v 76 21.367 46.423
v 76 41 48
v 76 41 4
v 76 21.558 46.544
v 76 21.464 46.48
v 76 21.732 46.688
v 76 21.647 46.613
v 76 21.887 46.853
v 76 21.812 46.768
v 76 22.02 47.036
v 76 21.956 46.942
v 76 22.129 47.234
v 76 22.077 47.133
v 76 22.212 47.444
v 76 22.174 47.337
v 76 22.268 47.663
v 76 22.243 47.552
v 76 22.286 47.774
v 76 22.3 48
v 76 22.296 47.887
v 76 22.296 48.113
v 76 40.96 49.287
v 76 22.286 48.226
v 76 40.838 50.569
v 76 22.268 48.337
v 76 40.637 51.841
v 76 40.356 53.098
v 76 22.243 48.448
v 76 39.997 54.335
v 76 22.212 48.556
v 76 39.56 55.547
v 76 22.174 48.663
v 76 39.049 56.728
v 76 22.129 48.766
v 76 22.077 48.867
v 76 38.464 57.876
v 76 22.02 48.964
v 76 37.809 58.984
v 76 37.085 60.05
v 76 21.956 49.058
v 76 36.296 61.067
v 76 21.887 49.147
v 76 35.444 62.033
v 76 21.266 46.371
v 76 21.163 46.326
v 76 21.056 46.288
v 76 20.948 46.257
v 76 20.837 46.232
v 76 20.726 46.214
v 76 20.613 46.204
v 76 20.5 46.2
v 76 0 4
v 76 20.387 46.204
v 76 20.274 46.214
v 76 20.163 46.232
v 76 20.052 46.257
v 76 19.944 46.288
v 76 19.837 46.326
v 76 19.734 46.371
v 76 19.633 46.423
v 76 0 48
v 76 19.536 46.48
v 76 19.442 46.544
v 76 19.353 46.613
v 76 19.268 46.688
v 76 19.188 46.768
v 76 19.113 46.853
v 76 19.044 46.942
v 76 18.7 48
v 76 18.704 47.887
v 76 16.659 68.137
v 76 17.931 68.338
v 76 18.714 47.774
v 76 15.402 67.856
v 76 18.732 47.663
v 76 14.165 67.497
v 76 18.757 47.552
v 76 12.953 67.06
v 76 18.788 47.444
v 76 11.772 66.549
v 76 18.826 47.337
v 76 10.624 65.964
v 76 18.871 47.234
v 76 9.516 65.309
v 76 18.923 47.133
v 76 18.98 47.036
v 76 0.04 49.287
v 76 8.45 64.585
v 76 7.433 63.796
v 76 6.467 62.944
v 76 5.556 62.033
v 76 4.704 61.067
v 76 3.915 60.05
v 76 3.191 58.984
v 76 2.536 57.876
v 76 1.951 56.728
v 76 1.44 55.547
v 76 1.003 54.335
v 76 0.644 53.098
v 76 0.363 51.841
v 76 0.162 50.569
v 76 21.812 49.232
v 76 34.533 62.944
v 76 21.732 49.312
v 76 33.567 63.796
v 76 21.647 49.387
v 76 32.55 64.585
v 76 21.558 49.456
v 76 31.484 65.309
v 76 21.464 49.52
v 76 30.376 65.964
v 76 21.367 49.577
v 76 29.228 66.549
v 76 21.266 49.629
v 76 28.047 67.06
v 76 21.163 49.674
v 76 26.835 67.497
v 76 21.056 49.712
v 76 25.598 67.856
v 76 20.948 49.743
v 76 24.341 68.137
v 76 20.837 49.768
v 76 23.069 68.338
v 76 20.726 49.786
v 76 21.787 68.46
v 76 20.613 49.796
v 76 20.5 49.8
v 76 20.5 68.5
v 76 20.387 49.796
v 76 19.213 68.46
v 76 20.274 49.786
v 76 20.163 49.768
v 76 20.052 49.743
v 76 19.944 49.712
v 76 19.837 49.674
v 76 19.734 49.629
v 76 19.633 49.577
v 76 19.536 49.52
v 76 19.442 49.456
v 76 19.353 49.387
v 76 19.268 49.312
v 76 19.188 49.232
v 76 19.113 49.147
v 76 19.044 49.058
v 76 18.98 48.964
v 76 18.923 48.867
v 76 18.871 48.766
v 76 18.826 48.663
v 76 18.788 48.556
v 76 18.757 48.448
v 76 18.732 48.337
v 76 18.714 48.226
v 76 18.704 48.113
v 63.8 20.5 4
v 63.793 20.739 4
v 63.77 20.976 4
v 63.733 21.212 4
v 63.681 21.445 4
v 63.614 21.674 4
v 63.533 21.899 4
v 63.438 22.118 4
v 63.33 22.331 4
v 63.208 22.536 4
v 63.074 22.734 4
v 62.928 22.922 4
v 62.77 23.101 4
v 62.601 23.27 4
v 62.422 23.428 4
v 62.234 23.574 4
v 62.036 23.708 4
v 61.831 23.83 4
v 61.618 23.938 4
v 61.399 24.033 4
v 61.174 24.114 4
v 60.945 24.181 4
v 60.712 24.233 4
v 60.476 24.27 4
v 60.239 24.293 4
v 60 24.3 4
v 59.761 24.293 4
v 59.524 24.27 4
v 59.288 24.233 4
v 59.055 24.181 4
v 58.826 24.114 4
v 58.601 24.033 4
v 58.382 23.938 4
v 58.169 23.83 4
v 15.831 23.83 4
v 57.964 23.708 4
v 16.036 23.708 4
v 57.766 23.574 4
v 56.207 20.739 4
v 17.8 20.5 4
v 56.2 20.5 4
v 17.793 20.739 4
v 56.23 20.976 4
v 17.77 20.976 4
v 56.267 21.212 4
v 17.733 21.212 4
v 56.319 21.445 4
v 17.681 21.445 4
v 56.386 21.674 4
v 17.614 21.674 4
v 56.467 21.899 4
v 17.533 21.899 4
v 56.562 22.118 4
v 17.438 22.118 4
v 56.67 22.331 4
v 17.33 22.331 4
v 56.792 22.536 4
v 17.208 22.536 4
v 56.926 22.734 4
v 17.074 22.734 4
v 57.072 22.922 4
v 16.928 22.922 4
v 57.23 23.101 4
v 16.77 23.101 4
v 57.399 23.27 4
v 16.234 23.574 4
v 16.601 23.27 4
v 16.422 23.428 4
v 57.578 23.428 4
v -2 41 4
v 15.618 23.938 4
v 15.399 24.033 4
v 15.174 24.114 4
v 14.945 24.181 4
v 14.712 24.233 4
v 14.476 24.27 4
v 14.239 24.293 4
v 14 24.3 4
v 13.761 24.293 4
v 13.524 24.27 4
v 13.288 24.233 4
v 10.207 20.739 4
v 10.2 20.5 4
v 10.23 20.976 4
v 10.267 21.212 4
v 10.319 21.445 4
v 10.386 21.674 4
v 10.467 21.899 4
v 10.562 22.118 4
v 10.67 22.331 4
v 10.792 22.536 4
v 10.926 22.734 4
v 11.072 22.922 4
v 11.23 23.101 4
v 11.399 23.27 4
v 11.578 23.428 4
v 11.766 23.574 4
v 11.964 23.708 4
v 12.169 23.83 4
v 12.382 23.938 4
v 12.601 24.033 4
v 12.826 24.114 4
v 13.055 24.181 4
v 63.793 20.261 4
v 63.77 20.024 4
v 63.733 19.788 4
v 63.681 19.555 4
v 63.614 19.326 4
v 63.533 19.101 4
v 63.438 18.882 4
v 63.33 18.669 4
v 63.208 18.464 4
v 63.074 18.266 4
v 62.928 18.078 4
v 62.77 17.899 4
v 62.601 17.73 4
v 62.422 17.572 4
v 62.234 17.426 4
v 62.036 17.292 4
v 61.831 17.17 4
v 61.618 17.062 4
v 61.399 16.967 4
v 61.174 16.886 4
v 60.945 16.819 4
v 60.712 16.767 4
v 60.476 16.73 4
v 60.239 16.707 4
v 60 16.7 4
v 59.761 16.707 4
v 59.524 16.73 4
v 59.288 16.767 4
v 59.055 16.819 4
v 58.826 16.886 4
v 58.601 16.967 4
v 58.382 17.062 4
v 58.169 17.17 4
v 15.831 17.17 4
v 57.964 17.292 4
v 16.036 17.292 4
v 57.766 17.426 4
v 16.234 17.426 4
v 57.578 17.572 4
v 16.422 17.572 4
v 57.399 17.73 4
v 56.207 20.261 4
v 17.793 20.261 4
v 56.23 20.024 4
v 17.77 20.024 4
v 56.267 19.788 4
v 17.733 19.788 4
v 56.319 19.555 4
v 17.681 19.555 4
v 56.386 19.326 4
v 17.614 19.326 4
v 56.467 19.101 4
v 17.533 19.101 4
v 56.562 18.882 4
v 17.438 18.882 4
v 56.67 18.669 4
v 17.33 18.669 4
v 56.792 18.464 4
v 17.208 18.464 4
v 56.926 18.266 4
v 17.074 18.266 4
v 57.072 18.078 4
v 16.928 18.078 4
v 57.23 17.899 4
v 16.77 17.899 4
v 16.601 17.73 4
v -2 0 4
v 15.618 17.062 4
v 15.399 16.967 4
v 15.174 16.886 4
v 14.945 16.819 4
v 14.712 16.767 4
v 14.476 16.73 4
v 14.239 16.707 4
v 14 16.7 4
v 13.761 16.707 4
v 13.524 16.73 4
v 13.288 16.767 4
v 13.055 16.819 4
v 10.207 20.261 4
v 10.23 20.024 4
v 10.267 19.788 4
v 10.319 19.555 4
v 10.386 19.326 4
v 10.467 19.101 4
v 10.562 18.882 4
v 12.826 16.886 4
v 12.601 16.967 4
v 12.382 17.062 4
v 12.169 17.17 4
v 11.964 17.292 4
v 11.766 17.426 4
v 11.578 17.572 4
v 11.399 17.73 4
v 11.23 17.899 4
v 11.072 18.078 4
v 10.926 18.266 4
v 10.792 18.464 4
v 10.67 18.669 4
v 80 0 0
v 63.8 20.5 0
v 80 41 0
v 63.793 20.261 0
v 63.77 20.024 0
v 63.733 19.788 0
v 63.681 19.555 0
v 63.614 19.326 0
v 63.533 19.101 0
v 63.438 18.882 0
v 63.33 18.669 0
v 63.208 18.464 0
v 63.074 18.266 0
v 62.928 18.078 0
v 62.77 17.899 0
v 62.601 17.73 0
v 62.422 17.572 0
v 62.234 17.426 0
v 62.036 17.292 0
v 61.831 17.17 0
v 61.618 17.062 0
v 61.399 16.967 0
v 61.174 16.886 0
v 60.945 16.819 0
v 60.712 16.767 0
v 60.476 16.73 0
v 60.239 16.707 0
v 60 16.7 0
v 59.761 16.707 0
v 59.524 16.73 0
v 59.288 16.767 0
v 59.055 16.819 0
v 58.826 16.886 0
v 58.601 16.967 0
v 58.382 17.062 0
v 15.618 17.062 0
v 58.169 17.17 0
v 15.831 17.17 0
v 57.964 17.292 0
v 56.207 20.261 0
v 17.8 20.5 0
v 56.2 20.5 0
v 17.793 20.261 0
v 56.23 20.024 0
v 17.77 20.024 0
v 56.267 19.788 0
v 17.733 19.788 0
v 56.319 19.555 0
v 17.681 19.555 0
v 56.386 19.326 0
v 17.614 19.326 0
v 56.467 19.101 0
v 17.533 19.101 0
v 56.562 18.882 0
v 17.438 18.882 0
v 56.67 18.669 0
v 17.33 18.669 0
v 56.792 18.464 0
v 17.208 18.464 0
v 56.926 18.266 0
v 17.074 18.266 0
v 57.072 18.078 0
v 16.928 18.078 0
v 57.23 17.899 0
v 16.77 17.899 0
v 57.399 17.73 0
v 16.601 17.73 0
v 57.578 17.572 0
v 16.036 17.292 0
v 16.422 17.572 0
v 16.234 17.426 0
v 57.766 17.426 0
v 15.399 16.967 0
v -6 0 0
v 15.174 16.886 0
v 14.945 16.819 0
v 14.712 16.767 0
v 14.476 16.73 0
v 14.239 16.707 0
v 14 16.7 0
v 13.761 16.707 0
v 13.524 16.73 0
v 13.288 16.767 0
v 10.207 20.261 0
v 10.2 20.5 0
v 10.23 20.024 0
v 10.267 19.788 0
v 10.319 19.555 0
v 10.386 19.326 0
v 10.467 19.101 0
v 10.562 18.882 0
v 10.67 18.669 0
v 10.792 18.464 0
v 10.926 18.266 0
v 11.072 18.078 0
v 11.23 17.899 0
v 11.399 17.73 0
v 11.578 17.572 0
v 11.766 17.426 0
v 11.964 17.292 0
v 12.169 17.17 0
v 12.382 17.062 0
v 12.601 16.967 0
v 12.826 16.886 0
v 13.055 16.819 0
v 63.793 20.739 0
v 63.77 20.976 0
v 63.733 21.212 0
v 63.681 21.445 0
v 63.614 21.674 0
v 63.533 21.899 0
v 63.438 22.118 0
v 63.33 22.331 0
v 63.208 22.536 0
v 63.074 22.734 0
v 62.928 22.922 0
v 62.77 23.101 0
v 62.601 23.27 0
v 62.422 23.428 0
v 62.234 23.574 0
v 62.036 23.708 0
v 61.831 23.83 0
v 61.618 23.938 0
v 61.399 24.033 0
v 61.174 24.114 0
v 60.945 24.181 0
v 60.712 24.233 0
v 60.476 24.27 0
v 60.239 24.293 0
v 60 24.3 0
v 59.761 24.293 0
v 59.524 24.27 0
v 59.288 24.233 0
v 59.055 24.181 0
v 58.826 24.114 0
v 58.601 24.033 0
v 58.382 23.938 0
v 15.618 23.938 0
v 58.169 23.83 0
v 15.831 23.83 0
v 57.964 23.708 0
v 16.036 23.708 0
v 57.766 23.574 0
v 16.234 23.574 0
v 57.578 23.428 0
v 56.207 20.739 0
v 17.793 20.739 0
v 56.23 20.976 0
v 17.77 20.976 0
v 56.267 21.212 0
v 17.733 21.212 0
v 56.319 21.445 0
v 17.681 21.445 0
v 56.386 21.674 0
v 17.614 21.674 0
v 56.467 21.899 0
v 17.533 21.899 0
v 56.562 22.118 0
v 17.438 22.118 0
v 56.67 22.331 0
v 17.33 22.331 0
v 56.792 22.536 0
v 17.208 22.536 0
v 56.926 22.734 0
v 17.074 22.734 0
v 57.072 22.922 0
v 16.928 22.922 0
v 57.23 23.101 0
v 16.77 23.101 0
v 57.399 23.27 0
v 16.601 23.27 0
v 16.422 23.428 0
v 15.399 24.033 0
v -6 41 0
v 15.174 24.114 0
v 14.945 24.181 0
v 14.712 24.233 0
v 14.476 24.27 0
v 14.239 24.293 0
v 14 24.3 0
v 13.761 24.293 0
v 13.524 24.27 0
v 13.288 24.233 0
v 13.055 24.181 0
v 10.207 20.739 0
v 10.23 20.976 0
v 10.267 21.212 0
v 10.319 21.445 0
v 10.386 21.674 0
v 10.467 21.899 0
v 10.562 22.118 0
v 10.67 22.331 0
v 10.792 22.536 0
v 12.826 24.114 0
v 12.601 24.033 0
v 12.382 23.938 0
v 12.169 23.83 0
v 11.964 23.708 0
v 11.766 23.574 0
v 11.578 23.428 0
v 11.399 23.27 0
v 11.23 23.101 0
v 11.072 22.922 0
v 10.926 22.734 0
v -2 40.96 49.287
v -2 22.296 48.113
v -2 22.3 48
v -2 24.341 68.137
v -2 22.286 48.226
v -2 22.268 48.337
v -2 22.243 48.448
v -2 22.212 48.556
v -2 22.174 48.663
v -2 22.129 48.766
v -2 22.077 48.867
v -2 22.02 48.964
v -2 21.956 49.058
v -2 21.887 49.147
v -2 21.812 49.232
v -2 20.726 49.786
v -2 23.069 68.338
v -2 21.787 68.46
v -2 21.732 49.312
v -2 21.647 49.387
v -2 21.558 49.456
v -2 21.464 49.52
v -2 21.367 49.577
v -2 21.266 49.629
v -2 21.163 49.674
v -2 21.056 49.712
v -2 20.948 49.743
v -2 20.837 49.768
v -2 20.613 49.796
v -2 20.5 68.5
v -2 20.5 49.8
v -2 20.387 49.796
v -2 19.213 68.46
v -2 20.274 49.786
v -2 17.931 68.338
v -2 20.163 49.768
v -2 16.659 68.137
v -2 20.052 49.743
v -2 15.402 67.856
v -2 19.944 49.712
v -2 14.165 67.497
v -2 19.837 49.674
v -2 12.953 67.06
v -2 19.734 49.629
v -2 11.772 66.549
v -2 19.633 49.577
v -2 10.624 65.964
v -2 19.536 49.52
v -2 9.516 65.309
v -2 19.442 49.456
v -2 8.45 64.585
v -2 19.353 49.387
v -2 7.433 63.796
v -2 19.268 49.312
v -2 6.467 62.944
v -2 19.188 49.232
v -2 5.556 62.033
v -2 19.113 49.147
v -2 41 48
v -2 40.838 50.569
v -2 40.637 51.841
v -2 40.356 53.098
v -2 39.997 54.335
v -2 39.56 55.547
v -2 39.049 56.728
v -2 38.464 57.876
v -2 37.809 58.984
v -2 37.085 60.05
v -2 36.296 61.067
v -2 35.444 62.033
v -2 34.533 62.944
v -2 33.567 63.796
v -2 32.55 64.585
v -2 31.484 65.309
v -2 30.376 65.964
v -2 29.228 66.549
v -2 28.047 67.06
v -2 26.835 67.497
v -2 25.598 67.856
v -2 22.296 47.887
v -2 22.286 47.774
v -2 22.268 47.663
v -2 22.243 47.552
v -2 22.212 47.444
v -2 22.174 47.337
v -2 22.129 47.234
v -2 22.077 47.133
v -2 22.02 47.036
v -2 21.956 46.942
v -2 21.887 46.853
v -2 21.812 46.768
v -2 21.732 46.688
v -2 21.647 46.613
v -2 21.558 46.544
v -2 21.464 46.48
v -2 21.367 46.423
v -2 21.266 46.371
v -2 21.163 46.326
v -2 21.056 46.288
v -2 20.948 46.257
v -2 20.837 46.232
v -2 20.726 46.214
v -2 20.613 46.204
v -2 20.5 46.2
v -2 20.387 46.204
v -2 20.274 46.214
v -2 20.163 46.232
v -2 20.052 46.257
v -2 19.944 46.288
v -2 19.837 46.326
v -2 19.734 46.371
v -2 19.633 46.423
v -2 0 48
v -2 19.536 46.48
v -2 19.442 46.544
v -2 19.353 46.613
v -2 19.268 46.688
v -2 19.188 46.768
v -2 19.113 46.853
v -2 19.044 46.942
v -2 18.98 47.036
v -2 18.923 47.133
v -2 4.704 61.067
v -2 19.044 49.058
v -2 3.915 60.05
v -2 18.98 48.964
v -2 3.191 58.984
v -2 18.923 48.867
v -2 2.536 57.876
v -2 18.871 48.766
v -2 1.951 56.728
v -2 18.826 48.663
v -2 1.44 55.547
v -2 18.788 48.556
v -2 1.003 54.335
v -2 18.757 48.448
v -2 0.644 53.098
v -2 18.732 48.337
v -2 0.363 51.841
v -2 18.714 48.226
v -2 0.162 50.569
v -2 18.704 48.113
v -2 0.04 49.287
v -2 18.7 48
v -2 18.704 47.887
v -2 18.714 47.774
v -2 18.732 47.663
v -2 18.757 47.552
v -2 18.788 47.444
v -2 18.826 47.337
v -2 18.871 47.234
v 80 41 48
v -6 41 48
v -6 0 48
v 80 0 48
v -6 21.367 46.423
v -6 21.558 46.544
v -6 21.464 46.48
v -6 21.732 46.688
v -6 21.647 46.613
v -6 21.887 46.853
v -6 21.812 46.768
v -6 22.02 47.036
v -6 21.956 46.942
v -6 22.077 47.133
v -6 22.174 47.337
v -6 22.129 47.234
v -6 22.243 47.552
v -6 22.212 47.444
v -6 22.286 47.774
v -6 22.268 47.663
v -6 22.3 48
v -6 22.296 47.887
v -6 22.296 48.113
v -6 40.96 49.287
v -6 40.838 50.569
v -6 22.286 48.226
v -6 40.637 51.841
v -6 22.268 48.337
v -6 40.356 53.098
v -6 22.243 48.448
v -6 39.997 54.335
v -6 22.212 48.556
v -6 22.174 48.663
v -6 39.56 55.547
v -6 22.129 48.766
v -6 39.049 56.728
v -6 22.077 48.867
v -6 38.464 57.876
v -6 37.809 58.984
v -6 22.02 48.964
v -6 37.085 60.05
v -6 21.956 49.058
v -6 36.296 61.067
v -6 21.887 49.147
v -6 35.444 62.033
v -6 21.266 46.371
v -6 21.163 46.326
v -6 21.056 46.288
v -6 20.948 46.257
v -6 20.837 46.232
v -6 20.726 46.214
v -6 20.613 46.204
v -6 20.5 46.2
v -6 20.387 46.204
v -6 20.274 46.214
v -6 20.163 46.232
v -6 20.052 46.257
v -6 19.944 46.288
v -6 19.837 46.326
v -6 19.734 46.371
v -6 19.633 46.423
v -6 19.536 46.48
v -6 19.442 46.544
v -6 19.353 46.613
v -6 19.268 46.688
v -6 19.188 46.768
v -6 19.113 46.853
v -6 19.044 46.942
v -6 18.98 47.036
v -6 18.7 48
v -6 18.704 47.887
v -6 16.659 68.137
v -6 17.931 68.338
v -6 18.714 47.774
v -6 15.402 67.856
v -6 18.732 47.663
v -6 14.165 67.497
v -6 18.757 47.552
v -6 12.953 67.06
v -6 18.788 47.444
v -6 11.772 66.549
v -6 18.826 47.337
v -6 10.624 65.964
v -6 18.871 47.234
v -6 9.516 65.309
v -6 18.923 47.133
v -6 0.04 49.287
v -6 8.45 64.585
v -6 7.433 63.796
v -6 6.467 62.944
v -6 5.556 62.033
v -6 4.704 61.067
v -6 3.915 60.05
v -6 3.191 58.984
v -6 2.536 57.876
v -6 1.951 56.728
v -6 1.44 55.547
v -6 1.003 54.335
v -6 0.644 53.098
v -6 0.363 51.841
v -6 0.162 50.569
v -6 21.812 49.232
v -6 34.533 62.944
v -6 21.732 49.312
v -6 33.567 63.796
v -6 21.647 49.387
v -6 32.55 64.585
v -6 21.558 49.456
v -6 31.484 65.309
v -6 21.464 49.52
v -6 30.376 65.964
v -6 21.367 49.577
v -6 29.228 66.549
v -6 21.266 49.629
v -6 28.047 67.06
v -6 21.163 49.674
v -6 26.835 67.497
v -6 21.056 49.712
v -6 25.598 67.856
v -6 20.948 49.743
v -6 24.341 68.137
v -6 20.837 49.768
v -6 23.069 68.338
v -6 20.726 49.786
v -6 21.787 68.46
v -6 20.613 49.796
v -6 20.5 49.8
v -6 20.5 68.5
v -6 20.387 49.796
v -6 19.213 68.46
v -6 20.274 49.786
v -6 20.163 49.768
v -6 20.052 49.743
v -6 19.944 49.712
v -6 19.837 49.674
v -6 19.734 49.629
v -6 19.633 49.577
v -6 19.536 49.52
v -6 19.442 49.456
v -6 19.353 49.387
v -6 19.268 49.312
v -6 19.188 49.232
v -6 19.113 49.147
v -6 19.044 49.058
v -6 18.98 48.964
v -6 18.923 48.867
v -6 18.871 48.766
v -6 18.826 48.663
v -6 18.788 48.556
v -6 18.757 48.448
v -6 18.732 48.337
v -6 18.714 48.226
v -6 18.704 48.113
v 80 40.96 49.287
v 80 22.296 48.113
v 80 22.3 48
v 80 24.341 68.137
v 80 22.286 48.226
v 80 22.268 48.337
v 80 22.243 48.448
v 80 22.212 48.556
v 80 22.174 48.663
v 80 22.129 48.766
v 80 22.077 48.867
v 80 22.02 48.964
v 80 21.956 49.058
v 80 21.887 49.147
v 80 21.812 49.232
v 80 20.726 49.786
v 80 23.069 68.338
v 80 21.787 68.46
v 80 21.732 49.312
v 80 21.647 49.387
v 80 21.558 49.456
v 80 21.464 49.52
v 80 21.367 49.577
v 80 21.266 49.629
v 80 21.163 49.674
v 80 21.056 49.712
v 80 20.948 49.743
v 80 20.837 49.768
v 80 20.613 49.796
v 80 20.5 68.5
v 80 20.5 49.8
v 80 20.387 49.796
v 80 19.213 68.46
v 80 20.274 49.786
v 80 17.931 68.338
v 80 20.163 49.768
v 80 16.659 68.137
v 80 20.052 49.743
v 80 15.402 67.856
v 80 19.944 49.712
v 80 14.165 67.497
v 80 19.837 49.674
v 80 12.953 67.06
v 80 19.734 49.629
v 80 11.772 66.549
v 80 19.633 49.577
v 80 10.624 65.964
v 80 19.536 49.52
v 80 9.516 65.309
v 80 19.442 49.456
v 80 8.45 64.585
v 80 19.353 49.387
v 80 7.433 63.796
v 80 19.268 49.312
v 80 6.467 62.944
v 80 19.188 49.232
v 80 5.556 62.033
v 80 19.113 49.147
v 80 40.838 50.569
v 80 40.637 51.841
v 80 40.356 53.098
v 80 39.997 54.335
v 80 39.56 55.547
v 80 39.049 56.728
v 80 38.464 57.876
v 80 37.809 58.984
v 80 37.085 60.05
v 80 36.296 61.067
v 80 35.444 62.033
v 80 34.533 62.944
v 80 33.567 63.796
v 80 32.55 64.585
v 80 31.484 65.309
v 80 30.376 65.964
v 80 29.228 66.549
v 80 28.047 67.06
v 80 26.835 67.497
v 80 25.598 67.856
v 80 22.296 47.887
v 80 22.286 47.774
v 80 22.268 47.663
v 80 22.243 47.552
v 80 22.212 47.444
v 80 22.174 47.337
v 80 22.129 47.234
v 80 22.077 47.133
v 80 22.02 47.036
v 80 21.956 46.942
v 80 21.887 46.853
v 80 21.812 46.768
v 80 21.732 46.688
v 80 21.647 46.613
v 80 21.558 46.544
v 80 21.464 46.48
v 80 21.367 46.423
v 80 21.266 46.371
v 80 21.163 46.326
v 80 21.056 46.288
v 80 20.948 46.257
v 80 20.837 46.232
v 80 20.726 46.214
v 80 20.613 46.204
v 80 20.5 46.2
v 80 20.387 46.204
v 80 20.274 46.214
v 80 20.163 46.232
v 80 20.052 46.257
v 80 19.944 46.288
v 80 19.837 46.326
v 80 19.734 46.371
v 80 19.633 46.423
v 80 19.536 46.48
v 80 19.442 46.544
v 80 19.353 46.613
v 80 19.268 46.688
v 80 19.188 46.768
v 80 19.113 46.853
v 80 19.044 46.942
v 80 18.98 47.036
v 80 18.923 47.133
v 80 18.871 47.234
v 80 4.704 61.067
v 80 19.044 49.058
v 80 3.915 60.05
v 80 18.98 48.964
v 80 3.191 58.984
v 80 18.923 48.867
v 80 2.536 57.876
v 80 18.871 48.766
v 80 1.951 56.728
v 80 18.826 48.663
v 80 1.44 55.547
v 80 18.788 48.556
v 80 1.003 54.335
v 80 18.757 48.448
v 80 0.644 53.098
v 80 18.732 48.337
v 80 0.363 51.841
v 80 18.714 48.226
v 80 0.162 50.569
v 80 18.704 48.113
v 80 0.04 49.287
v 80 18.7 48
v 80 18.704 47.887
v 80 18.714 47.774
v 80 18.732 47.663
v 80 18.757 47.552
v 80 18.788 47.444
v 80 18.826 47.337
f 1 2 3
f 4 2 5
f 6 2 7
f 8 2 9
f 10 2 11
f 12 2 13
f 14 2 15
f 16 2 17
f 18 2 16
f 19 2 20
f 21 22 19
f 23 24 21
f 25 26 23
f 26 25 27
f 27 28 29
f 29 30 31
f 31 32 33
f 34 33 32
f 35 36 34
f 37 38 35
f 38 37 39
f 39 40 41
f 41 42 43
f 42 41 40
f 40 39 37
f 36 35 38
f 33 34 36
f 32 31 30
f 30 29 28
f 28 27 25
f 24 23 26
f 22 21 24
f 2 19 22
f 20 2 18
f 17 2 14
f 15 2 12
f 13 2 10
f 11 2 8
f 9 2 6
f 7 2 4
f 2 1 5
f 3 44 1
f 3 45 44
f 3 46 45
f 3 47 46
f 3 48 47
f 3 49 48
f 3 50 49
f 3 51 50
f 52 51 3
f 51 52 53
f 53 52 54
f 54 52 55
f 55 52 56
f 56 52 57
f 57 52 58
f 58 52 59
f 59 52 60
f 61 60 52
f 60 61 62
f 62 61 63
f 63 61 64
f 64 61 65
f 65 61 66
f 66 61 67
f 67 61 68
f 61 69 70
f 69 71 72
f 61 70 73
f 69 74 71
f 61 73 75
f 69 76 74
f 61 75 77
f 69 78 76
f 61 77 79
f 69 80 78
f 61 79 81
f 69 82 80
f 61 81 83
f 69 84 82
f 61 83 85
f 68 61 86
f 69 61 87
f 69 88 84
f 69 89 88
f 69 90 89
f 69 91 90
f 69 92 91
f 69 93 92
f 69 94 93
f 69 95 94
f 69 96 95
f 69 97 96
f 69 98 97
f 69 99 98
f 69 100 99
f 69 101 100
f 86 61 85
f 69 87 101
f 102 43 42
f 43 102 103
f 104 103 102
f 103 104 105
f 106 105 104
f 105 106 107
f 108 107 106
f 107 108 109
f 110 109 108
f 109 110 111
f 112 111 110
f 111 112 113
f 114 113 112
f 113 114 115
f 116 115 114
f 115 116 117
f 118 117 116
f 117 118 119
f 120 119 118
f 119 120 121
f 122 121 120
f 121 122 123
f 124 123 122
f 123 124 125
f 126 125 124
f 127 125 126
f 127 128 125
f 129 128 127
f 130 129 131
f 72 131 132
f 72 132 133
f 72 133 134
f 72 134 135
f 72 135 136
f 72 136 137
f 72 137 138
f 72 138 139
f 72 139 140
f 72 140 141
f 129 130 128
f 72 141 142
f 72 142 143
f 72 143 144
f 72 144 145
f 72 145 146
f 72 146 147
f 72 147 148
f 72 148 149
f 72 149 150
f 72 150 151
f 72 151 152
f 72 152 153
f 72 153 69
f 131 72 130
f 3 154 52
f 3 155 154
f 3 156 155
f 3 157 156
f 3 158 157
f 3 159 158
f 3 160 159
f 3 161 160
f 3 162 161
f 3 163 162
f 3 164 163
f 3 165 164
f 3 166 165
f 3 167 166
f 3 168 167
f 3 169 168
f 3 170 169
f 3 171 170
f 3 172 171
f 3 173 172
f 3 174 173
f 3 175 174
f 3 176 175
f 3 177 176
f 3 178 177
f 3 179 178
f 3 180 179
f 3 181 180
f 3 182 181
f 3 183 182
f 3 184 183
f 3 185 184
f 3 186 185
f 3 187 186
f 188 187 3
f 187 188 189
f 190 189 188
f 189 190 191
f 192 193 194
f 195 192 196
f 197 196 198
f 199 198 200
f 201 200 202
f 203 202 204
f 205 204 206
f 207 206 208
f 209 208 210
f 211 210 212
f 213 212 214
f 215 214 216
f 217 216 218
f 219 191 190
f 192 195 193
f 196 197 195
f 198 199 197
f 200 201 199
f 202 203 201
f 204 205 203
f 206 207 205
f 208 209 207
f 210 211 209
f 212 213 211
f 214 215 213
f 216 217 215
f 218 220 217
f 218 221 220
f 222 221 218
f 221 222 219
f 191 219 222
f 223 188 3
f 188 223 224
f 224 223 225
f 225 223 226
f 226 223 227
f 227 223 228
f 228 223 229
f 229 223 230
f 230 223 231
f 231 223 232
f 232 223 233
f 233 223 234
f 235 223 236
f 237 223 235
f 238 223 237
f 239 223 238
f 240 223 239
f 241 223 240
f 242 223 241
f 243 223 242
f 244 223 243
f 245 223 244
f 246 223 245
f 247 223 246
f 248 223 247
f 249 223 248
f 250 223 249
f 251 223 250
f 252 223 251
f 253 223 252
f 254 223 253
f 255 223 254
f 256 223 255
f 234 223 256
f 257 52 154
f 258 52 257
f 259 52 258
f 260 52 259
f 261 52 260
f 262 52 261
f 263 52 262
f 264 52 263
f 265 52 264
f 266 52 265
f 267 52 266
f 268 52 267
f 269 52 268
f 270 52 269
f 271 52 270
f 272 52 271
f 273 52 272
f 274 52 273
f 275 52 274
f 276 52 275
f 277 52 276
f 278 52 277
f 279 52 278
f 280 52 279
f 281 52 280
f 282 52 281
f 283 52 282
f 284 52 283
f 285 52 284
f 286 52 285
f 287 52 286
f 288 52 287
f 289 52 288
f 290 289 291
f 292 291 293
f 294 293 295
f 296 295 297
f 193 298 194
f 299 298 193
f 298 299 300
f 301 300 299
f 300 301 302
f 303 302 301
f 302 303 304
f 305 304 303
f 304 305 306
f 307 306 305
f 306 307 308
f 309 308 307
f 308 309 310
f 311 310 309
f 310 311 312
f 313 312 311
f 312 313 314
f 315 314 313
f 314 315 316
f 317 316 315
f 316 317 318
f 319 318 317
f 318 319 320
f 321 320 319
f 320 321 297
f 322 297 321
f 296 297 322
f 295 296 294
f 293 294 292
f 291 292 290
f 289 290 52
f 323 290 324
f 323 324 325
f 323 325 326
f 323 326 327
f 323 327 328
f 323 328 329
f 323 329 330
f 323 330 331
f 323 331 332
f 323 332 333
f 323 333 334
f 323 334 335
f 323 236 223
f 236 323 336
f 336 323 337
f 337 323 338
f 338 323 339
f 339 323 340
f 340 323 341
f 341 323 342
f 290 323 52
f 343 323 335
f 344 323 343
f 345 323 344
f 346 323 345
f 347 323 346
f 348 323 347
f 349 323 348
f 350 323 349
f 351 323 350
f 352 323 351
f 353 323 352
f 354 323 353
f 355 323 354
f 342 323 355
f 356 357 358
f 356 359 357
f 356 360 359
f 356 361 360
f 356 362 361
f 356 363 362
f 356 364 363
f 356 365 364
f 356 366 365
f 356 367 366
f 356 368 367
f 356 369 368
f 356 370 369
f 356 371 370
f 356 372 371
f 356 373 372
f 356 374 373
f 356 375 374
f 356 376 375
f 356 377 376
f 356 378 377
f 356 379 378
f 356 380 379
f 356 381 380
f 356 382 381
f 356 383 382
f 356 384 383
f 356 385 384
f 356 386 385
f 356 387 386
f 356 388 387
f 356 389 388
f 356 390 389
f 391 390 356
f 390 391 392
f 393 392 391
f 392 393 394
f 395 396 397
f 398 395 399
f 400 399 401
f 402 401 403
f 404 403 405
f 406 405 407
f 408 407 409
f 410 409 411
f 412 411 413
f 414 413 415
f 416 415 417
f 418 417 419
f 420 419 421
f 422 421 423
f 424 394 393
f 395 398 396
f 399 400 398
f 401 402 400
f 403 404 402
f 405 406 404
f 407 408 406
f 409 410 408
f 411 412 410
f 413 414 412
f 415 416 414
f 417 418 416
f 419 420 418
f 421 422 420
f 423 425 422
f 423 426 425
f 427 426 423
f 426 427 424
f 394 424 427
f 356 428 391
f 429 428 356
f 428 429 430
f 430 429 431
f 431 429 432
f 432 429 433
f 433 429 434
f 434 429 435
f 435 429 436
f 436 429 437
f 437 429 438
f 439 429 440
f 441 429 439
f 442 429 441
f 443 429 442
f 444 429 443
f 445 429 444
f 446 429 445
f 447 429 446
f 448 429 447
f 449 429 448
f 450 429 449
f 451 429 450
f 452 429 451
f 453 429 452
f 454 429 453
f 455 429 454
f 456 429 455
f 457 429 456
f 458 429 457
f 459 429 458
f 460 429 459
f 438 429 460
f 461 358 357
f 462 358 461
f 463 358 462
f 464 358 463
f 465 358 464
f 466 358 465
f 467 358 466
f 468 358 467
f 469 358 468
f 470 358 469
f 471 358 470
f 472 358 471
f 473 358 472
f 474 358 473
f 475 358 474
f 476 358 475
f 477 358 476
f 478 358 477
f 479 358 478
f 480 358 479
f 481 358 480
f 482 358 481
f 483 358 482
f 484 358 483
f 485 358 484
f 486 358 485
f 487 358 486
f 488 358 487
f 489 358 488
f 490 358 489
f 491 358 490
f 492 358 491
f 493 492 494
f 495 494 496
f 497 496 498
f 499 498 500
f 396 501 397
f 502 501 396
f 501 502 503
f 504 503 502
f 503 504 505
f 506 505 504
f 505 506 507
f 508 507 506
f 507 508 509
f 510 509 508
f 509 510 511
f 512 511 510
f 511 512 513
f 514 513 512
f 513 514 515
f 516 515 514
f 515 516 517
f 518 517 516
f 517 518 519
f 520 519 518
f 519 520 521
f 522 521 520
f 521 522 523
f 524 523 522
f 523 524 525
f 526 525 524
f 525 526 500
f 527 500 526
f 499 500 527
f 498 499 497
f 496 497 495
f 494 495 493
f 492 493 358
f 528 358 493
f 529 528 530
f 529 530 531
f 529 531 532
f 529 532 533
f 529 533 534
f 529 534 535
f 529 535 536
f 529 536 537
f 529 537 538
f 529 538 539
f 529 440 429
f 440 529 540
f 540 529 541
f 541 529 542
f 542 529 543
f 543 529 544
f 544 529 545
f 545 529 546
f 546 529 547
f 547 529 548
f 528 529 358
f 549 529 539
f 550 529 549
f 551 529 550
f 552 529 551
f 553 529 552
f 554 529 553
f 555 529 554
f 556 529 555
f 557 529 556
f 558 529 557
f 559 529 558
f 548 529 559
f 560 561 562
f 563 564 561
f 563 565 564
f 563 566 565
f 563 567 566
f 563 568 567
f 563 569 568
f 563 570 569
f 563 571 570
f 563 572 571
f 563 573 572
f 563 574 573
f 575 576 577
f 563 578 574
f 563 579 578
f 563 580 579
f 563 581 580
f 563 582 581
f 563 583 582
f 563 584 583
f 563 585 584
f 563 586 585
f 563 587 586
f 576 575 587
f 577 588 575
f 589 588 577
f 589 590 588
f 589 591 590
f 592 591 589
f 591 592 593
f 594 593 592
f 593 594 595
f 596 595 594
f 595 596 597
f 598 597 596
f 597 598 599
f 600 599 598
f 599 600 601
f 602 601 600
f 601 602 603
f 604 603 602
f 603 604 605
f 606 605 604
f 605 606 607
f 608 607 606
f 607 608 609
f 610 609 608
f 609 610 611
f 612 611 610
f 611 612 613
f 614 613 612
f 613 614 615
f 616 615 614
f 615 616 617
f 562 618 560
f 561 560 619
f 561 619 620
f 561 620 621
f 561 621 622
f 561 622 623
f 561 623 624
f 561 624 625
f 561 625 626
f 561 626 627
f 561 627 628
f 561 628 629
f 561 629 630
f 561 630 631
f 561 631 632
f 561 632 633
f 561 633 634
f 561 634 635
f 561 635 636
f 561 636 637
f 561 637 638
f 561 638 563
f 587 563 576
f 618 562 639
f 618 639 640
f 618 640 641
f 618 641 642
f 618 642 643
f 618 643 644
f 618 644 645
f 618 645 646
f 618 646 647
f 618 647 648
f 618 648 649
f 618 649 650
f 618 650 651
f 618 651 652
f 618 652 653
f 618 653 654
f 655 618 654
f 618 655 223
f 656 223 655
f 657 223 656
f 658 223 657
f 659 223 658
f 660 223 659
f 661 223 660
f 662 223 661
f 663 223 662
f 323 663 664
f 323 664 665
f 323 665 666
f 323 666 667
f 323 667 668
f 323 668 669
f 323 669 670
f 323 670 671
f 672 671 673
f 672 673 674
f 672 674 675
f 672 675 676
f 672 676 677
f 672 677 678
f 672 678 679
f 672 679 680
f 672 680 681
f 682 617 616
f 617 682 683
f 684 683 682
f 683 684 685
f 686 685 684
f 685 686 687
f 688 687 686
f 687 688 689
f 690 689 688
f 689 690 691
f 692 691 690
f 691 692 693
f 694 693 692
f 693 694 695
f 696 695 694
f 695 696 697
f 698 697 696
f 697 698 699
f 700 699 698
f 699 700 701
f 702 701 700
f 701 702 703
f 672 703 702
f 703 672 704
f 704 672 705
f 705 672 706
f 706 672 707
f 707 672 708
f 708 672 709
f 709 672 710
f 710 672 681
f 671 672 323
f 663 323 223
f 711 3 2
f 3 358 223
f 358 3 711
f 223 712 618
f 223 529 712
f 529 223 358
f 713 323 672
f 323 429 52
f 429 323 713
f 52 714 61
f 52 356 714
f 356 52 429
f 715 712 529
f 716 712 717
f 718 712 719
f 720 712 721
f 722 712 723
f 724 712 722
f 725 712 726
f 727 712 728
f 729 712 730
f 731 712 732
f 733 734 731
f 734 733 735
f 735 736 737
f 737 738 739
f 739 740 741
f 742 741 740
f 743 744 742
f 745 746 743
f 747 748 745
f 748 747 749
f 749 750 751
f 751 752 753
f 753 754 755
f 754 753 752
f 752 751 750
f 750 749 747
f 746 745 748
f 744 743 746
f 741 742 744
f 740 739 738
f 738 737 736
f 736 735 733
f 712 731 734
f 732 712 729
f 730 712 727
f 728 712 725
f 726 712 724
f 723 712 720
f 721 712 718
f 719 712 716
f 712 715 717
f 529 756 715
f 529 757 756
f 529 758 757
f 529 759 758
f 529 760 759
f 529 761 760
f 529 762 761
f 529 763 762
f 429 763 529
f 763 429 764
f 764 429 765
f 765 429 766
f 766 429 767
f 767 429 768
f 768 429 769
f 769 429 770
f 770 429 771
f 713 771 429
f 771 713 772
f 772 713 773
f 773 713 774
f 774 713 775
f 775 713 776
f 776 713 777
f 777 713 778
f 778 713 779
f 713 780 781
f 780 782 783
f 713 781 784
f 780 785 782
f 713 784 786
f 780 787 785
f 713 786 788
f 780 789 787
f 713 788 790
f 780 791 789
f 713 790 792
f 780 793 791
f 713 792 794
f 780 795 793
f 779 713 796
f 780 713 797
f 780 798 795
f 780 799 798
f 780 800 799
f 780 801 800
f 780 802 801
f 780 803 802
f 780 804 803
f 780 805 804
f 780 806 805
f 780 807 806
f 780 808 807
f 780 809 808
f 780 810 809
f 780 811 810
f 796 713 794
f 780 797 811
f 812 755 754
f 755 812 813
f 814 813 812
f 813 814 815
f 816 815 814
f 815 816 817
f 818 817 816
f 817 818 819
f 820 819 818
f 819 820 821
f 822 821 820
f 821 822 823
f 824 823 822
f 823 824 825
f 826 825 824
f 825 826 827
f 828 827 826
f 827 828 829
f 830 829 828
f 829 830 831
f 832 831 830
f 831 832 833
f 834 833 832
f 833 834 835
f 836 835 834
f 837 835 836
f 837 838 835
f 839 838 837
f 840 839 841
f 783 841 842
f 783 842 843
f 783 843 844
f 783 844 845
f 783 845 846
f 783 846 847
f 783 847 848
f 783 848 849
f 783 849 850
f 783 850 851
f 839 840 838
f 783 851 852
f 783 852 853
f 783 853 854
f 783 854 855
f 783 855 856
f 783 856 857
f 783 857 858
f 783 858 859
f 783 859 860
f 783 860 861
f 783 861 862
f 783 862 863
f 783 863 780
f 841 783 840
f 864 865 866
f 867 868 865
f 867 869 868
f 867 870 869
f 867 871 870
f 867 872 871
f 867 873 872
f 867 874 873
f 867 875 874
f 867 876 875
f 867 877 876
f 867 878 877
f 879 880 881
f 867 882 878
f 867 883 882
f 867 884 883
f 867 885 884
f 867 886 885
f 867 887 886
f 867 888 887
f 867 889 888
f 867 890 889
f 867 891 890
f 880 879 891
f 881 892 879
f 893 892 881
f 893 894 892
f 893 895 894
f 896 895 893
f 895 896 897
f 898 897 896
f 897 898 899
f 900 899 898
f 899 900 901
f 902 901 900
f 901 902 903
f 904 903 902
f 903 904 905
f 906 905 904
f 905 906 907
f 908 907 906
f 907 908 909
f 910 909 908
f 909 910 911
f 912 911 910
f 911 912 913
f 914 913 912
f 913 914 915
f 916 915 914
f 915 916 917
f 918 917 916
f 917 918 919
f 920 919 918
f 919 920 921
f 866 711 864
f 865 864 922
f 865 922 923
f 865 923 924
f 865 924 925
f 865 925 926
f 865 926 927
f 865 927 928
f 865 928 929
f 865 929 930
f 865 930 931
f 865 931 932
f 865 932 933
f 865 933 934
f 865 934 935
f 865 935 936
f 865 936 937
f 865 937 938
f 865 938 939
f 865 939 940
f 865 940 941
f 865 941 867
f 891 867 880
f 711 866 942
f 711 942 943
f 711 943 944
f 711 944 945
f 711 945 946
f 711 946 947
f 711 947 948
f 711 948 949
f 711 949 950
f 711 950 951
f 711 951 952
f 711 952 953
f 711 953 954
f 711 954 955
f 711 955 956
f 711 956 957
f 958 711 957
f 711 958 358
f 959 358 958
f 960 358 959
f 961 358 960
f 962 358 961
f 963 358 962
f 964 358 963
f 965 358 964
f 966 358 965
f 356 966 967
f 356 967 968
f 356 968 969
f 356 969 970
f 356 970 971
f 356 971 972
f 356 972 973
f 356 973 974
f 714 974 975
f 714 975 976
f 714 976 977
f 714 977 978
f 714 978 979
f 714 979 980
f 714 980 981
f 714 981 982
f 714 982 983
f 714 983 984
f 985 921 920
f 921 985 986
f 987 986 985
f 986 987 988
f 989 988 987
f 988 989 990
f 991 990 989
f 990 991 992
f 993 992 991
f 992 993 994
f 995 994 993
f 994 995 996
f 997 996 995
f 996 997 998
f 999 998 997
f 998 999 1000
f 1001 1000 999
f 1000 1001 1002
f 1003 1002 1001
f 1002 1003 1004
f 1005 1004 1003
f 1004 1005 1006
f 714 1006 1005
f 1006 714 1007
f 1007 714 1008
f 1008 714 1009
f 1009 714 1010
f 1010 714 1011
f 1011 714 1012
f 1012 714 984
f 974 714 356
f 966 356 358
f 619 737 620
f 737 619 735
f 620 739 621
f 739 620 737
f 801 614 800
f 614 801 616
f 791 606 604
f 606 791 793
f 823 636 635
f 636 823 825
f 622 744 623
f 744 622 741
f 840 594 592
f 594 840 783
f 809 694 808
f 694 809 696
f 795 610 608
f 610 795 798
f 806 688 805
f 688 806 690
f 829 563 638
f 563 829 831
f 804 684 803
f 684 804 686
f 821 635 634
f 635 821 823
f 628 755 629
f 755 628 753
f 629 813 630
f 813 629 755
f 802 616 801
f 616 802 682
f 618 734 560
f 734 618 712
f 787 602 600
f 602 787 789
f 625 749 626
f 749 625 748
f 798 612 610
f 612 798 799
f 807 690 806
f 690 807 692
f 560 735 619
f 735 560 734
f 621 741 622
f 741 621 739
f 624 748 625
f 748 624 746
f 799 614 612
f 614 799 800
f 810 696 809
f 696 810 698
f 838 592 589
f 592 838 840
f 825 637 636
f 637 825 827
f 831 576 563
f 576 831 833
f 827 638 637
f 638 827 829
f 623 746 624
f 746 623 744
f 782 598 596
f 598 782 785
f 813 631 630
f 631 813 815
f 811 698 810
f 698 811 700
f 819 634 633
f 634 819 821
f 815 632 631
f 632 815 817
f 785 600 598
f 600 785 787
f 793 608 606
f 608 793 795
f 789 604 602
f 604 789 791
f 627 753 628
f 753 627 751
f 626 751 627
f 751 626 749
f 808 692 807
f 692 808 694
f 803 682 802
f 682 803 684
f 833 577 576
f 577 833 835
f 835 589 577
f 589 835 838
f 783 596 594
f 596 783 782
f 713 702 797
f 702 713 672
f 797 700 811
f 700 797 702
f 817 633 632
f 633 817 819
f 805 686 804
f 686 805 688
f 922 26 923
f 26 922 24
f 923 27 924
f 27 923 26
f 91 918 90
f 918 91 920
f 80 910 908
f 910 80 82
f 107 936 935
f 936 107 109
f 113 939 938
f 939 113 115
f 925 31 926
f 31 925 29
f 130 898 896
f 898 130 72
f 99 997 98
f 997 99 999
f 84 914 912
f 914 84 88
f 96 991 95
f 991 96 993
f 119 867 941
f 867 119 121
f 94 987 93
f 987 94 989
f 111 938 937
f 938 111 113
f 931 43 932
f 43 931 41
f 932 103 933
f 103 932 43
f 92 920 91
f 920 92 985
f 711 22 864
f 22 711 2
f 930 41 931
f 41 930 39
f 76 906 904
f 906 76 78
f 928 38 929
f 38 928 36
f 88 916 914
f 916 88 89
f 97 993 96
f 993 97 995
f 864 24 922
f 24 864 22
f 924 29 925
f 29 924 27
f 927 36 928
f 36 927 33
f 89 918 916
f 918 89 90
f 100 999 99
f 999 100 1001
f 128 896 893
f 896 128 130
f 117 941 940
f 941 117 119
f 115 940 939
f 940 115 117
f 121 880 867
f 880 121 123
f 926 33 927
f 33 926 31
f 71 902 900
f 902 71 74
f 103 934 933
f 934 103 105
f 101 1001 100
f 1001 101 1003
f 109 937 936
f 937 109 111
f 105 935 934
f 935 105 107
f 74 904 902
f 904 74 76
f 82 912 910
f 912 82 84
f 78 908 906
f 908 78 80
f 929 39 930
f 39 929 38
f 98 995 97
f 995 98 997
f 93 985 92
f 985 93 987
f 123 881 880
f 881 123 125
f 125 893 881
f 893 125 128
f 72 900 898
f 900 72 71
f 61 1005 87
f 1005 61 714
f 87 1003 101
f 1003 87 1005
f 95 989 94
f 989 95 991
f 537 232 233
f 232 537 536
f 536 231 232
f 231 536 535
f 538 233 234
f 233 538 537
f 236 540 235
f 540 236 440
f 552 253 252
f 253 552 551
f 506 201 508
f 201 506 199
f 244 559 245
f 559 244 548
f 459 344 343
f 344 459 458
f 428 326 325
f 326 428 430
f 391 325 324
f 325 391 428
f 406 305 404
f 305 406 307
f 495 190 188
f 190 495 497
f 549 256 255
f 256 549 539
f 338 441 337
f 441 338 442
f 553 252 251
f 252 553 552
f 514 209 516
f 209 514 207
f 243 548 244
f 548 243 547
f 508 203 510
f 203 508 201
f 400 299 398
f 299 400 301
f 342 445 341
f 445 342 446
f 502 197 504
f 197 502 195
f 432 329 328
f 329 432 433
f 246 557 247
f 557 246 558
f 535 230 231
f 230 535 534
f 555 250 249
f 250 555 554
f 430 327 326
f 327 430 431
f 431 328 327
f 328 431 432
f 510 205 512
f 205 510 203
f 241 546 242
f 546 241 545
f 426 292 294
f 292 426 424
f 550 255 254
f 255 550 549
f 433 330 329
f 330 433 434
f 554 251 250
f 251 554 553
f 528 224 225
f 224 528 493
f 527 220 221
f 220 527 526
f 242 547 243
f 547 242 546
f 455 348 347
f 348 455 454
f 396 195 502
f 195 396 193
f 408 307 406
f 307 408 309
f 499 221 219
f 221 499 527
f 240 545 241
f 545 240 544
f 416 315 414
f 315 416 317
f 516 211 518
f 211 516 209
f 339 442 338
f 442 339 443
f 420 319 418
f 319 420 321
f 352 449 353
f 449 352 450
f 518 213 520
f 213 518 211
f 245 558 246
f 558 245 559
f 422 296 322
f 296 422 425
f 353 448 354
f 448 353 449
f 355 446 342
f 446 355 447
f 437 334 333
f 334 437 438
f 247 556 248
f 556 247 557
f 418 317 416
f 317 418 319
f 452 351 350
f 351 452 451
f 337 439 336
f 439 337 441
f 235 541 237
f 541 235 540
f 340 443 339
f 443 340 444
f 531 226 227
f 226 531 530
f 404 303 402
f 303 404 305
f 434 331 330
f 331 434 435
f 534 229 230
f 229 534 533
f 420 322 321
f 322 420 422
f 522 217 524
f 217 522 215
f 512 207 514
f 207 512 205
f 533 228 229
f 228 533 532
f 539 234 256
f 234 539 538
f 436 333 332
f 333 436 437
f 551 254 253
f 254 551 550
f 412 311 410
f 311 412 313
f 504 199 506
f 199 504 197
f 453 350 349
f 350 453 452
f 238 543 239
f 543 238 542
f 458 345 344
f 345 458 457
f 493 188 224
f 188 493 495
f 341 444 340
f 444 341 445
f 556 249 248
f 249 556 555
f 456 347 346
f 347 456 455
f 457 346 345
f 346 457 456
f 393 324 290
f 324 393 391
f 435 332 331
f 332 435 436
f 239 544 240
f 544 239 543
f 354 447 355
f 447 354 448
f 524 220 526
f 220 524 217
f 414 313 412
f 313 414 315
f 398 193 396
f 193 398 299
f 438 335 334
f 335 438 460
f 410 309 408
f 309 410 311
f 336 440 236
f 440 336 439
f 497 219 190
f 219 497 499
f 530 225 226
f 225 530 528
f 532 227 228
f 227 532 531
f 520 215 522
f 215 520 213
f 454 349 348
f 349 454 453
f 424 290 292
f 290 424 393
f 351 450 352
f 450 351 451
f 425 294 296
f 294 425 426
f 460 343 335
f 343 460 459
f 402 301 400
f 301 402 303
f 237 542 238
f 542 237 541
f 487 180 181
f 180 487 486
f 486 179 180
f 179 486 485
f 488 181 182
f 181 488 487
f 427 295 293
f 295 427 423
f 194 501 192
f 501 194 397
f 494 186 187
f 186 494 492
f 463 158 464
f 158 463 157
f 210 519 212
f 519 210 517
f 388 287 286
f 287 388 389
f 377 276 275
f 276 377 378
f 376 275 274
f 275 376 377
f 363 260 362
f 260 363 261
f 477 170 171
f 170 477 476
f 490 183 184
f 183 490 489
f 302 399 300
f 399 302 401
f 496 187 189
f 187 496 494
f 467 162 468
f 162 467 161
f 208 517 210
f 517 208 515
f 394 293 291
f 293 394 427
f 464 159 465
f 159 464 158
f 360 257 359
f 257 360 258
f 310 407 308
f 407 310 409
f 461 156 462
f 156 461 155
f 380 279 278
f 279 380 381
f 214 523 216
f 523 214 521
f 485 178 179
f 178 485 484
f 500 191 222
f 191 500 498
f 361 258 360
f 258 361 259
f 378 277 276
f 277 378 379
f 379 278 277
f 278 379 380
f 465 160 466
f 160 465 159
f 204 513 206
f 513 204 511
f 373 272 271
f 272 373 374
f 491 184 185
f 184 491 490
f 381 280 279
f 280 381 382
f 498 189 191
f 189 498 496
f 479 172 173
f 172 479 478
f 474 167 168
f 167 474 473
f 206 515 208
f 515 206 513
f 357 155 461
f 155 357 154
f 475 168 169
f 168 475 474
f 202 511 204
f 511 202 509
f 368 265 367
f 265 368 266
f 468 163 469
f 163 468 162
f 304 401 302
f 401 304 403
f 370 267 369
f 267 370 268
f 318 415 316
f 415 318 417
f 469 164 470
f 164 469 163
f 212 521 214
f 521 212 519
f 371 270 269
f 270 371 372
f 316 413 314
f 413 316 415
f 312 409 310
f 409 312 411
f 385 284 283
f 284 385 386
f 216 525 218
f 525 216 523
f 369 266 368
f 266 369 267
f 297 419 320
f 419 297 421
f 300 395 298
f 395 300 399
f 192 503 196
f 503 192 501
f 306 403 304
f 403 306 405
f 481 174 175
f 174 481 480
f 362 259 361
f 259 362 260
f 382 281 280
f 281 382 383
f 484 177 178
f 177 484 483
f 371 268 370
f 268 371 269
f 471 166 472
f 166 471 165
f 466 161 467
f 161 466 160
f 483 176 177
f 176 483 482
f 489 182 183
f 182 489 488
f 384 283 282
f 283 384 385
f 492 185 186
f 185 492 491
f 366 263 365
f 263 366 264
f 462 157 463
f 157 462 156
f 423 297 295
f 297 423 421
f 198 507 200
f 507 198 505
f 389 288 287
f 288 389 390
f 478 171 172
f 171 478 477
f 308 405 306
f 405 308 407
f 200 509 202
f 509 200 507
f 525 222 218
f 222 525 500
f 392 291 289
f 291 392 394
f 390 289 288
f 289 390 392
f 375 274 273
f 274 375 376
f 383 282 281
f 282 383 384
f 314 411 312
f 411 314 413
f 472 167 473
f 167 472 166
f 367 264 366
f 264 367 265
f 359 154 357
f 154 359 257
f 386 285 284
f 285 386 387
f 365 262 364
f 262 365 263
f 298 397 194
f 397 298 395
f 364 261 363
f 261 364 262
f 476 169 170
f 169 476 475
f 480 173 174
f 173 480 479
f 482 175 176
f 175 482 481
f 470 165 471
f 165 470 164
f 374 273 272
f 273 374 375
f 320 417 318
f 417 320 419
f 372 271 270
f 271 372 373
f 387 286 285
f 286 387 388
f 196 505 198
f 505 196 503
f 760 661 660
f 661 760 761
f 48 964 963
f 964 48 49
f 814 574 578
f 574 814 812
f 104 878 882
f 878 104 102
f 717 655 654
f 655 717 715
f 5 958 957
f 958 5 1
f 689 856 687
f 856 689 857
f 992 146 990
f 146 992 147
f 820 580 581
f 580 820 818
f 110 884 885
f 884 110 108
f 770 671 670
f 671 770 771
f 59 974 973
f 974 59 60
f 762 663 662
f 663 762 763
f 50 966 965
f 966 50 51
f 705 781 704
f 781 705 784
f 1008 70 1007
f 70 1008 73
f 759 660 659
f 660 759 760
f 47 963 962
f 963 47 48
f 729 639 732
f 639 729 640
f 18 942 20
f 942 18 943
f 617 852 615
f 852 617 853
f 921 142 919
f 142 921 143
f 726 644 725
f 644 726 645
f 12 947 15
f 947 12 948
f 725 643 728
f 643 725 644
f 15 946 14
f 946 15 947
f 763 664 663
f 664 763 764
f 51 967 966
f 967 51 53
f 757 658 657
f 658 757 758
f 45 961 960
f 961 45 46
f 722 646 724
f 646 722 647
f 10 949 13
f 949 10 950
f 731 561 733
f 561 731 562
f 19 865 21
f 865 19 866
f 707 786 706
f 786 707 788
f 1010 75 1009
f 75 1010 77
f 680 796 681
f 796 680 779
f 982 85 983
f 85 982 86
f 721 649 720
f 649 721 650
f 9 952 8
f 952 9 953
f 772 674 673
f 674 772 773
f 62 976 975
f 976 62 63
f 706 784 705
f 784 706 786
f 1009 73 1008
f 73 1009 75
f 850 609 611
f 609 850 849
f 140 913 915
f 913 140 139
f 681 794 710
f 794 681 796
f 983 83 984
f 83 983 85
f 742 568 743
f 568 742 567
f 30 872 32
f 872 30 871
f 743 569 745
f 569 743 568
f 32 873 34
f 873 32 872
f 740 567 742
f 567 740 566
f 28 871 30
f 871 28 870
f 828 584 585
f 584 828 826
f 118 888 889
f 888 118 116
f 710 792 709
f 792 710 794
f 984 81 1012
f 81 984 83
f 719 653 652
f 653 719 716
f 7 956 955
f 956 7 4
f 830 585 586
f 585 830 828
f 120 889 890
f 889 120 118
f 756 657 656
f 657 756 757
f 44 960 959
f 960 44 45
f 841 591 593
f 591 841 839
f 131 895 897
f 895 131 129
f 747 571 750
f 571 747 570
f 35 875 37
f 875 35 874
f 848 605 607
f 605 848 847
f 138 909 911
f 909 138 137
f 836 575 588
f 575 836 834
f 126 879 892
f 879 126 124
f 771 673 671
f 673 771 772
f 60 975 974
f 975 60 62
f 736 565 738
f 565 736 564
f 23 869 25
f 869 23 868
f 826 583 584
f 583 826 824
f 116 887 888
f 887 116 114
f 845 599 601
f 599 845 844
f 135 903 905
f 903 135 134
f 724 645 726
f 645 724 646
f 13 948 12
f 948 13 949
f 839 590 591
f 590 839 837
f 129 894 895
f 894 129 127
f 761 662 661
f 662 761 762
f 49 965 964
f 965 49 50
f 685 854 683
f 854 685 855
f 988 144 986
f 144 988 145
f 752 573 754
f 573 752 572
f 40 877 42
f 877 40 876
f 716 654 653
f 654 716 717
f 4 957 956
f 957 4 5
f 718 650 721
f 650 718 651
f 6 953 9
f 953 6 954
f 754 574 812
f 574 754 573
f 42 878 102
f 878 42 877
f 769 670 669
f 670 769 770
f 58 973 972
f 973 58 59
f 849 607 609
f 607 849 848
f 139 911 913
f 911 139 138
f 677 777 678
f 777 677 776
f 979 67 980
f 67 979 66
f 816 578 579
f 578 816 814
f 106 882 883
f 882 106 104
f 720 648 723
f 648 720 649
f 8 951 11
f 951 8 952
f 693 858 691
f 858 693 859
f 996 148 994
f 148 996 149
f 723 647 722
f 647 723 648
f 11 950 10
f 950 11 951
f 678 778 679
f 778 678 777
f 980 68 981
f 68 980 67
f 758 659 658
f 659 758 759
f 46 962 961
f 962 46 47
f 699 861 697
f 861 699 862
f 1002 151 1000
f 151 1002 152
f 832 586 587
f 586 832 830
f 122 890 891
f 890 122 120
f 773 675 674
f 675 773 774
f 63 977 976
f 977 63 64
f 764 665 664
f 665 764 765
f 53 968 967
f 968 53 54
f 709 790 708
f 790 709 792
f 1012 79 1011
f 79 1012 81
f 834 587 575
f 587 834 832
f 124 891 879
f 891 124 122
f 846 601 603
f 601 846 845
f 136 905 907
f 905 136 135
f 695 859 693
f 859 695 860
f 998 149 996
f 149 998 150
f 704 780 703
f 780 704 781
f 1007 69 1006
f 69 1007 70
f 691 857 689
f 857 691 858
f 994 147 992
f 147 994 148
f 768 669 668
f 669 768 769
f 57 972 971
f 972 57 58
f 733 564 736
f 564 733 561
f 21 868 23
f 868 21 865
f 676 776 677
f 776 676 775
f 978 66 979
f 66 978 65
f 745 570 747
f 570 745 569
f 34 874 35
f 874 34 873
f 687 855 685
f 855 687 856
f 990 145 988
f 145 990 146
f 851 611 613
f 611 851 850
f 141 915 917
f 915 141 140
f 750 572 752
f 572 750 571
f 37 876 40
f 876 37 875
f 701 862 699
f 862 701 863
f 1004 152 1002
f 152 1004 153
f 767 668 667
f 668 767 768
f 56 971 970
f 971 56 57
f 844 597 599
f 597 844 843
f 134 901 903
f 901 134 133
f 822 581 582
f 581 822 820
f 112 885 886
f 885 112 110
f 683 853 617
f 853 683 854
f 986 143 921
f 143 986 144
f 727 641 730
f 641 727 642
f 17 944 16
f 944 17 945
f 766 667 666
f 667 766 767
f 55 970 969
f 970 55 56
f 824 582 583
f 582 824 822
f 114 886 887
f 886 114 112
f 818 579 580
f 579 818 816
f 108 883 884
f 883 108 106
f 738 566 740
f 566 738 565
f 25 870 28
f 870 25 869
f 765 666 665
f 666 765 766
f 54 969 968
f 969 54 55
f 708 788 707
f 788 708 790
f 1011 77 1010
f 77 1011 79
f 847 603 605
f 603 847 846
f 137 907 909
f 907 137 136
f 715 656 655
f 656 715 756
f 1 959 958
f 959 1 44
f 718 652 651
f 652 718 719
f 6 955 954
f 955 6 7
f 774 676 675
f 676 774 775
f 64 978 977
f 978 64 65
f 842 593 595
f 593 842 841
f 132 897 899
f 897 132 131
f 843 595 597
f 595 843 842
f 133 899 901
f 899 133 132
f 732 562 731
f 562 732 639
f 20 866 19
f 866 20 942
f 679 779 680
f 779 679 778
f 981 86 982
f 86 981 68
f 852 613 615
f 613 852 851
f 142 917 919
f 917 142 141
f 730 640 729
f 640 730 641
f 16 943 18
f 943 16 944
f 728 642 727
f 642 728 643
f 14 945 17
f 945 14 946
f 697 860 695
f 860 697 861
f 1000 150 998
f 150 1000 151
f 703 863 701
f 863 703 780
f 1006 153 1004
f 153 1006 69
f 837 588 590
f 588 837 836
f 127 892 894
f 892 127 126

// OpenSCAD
difference(){
	union(){
        
       translate([-2,0,0]){
           cube([78,41,4], center=false);
       }

       translate([-6,0,0]){
           cube([4,41,48], center=false);
       }
       translate([76,0,0]){
           cube([4,41,48], center=false);
       }
       translate([-6,41/2,48]){
            rotate(a = [0,90,0]) {
              cylinder(h=4, r=41/2, $fn=100, center=false);
            }
       }	
       translate([76,41/2,48]){
            rotate(a = [0,90,0]) {
              cylinder(h=4, r=41/2, $fn=100, center=false);
            }
       }	


	}
	union() {
 
       translate([74/2-23,41/2,-1]){
            rotate(a = [0,0,90]) {
              cylinder(h=600, r=3.8, $fn=100, center=false);
            }
       }	
       translate([74/2+23,41/2,-1]){
            rotate(a = [0,0,90]) {
              cylinder(h=600, r=3.8, $fn=100, center=false);
            }
       }	
       
       translate([-10,41/2,48]){
            rotate(a = [0,90,0]) {
              cylinder(h=999, r=1.8, $fn=100, center=false);
            }
       }	




        
	}
}
